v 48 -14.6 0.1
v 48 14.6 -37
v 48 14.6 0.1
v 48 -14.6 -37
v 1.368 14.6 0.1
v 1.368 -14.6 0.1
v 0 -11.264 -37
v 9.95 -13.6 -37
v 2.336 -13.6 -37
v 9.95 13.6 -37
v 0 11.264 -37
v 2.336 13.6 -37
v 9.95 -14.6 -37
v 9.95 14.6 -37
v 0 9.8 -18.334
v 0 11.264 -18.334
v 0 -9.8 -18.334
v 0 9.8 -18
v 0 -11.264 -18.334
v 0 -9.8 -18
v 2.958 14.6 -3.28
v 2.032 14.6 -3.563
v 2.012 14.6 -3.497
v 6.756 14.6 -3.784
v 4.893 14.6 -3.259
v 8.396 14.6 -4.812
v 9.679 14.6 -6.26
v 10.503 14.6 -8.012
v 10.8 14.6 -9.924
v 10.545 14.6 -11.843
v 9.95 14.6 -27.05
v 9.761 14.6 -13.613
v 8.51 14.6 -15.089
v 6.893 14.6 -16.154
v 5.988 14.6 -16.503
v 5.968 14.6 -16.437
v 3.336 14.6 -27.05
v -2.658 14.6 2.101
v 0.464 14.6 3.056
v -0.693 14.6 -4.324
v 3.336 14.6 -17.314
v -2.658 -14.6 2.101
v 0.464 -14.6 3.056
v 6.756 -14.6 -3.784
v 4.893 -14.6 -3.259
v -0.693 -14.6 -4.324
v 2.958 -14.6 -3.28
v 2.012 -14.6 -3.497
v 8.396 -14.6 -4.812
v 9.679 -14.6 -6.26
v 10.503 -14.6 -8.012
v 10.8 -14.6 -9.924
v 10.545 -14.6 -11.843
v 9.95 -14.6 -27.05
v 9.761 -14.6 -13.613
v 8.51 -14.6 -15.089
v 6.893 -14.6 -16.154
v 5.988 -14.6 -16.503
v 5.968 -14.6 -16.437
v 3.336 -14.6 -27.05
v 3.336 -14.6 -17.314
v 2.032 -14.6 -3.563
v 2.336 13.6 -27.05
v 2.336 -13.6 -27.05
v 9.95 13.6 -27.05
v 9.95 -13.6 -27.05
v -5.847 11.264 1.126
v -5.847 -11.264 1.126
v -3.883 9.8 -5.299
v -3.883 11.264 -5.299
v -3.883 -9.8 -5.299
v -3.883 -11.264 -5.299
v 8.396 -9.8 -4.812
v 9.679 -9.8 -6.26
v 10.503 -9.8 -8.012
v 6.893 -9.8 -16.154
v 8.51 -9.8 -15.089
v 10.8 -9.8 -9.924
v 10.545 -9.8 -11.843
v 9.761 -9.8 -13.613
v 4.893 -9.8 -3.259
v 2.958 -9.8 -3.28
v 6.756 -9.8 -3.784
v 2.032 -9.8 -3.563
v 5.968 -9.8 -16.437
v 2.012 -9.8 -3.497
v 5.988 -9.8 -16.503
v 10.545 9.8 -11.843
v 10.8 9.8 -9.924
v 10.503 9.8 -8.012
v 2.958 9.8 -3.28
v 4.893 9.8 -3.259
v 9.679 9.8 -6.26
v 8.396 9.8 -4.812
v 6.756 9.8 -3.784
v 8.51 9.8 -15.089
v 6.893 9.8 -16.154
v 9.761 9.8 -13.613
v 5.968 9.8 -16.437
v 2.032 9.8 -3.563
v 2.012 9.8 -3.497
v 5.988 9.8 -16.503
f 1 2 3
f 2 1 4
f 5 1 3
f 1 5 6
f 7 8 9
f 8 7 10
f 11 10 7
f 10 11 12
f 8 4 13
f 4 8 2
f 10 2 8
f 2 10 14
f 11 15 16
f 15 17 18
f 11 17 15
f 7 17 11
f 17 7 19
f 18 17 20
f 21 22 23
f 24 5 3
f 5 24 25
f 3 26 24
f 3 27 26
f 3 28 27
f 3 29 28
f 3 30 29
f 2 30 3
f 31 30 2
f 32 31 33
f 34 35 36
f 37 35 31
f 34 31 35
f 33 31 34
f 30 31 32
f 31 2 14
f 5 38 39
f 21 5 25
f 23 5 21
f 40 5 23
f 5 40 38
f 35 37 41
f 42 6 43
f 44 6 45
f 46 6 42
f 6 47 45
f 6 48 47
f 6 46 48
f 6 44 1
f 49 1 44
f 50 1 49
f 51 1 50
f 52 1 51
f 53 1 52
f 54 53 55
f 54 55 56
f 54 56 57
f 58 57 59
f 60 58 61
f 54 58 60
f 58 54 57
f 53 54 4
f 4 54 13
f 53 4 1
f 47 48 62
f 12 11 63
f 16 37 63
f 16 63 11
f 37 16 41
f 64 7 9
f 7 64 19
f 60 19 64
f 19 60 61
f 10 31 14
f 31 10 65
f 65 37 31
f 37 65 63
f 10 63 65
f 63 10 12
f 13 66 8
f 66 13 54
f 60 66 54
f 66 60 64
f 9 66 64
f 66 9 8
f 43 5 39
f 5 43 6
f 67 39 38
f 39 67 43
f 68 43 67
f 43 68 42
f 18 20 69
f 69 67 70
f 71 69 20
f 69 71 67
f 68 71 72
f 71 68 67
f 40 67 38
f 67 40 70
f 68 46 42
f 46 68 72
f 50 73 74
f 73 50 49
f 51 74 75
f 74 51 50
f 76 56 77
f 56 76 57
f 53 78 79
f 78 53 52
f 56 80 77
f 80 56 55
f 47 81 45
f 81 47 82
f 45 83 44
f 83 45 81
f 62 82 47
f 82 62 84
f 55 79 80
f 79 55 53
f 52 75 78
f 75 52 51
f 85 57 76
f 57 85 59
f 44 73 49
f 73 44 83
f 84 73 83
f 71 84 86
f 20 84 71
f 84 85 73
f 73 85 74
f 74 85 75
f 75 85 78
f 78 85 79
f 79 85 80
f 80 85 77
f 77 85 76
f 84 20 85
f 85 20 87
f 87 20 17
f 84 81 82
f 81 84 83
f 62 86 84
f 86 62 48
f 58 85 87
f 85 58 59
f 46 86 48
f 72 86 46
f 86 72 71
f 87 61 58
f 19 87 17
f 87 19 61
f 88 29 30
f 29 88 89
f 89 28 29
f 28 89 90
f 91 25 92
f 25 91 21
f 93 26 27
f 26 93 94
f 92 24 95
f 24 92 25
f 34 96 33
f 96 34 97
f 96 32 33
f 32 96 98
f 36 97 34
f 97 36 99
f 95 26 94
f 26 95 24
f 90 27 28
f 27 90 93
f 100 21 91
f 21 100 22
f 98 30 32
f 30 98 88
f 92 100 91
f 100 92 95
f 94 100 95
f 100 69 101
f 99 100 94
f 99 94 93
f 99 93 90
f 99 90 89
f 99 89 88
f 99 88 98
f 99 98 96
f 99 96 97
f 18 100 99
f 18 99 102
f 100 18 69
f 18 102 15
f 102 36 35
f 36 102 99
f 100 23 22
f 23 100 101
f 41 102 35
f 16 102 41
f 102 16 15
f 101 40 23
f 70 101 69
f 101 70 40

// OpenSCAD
//
// RU9C75
// Ruger PC Carbine, CZ-75 adapter
//

// use <ru9_adapter.scad>;

// Lower Outer Mold
module lom() {

    // LOM C0: the lower cube zero
    lom_c0_len = 48.0;
    lom_c0_w = 29.2;
    lom_c0_h = 37.0;

    difference () {
        union () {

            translate([0, 0, lom_c0_h*-1]) {
                difference () {
                    // The main body is a straight cube.
                    translate([0, (lom_c0_w/2)*-1, 0])
                        cube([lom_c0_len, lom_c0_w, lom_c0_h + 0.1]);

                    // Massive bevel is necessary.
                    translate([-0.1, (lom_c0_w/2 + 0.1), (lom_c0_h - 11.0)/2 - 0.1])
                        rotate(-45.0, [0,0,1])
                            cube([5.0, 5.0, lom_c0_h - 11.0 + 0.1], center=true);
                    translate([-0.1, (lom_c0_w/2 + 0.1)*-1, (lom_c0_h - 11.0)/2 - 0.1])
                        rotate(45.0, [0,0,1])
                            cube([5.0, 5.0, lom_c0_h - 11.0 + 0.1], center=true);

                    // Little side indentations are necessary too.
                    translate([10.0/2-0.1, (lom_c0_w/2), 10.0/2-0.1])
                        cube([10.0 + 0.1, 2.0, 10.0 + 0.1], center=true);
                    translate([10.0/2-0.1, (lom_c0_w/2)*-1, 10.0/2-0.1])
                        cube([10.0 + 0.1, 2.0, 10.0 + 0.1], center=true);
                }
            }

            // A litte slope in front, magazine intrudes into it.
            translate([0, 0, -18.0]) {
                rotate(-17.0, [0,1,0]) {
                    lom_slope_h = 20.0;
                    difference () {
                        translate([0, (lom_c0_w/2)*-1, 0])
                            cube([6.6, lom_c0_w, lom_slope_h]);
                        // Massive bevel is necessary.
                        translate([-0.1, (lom_c0_w/2 + 0.1), lom_slope_h/2])
                            rotate(-45.0, [0,0,1])
                                cube([5.0, 5.0, lom_slope_h + 0.2], center=true);
                        translate([-0.1, (lom_c0_w/2 + 0.1)*-1, lom_slope_h/2])
                            rotate(45.0, [0,0,1])
                                cube([5.0, 5.0, lom_slope_h + 0.2], center=true);
                    }
                }
            } // translate
        }

        // Latch cutouts
        lom_latch_r = 6.8;
        translate([4.0, (lom_c0_w/2 - 4.8)*-1, -10.0]) {
            rotate(-17.0, [0,1,0])
                rotate(90.0, [1,0,0])
                    union () {
                        cylinder(4.8 + 0.1, lom_latch_r, lom_latch_r);
                        translate([-7.0, -lom_latch_r, 0])
                            cube([7.0, lom_latch_r*2, 4.8 + 0.1]);
                    }
        }
        translate([4.0, (lom_c0_w/2 - 4.8), -10.0]) {
            rotate(-17.0, [0,1,0])
               rotate(-90.0, [1,0,0])
                    union () {
                        cylinder(4.8 + 0.1, lom_latch_r, lom_latch_r);
                        translate([-7.0, -lom_latch_r, 0])
                            cube([7.0, lom_latch_r*2, 4.8 + 0.1]);
                    }
        }
    }
}

module adapter () {
    lom();
}

module main () {
    adapter();
}

main();
